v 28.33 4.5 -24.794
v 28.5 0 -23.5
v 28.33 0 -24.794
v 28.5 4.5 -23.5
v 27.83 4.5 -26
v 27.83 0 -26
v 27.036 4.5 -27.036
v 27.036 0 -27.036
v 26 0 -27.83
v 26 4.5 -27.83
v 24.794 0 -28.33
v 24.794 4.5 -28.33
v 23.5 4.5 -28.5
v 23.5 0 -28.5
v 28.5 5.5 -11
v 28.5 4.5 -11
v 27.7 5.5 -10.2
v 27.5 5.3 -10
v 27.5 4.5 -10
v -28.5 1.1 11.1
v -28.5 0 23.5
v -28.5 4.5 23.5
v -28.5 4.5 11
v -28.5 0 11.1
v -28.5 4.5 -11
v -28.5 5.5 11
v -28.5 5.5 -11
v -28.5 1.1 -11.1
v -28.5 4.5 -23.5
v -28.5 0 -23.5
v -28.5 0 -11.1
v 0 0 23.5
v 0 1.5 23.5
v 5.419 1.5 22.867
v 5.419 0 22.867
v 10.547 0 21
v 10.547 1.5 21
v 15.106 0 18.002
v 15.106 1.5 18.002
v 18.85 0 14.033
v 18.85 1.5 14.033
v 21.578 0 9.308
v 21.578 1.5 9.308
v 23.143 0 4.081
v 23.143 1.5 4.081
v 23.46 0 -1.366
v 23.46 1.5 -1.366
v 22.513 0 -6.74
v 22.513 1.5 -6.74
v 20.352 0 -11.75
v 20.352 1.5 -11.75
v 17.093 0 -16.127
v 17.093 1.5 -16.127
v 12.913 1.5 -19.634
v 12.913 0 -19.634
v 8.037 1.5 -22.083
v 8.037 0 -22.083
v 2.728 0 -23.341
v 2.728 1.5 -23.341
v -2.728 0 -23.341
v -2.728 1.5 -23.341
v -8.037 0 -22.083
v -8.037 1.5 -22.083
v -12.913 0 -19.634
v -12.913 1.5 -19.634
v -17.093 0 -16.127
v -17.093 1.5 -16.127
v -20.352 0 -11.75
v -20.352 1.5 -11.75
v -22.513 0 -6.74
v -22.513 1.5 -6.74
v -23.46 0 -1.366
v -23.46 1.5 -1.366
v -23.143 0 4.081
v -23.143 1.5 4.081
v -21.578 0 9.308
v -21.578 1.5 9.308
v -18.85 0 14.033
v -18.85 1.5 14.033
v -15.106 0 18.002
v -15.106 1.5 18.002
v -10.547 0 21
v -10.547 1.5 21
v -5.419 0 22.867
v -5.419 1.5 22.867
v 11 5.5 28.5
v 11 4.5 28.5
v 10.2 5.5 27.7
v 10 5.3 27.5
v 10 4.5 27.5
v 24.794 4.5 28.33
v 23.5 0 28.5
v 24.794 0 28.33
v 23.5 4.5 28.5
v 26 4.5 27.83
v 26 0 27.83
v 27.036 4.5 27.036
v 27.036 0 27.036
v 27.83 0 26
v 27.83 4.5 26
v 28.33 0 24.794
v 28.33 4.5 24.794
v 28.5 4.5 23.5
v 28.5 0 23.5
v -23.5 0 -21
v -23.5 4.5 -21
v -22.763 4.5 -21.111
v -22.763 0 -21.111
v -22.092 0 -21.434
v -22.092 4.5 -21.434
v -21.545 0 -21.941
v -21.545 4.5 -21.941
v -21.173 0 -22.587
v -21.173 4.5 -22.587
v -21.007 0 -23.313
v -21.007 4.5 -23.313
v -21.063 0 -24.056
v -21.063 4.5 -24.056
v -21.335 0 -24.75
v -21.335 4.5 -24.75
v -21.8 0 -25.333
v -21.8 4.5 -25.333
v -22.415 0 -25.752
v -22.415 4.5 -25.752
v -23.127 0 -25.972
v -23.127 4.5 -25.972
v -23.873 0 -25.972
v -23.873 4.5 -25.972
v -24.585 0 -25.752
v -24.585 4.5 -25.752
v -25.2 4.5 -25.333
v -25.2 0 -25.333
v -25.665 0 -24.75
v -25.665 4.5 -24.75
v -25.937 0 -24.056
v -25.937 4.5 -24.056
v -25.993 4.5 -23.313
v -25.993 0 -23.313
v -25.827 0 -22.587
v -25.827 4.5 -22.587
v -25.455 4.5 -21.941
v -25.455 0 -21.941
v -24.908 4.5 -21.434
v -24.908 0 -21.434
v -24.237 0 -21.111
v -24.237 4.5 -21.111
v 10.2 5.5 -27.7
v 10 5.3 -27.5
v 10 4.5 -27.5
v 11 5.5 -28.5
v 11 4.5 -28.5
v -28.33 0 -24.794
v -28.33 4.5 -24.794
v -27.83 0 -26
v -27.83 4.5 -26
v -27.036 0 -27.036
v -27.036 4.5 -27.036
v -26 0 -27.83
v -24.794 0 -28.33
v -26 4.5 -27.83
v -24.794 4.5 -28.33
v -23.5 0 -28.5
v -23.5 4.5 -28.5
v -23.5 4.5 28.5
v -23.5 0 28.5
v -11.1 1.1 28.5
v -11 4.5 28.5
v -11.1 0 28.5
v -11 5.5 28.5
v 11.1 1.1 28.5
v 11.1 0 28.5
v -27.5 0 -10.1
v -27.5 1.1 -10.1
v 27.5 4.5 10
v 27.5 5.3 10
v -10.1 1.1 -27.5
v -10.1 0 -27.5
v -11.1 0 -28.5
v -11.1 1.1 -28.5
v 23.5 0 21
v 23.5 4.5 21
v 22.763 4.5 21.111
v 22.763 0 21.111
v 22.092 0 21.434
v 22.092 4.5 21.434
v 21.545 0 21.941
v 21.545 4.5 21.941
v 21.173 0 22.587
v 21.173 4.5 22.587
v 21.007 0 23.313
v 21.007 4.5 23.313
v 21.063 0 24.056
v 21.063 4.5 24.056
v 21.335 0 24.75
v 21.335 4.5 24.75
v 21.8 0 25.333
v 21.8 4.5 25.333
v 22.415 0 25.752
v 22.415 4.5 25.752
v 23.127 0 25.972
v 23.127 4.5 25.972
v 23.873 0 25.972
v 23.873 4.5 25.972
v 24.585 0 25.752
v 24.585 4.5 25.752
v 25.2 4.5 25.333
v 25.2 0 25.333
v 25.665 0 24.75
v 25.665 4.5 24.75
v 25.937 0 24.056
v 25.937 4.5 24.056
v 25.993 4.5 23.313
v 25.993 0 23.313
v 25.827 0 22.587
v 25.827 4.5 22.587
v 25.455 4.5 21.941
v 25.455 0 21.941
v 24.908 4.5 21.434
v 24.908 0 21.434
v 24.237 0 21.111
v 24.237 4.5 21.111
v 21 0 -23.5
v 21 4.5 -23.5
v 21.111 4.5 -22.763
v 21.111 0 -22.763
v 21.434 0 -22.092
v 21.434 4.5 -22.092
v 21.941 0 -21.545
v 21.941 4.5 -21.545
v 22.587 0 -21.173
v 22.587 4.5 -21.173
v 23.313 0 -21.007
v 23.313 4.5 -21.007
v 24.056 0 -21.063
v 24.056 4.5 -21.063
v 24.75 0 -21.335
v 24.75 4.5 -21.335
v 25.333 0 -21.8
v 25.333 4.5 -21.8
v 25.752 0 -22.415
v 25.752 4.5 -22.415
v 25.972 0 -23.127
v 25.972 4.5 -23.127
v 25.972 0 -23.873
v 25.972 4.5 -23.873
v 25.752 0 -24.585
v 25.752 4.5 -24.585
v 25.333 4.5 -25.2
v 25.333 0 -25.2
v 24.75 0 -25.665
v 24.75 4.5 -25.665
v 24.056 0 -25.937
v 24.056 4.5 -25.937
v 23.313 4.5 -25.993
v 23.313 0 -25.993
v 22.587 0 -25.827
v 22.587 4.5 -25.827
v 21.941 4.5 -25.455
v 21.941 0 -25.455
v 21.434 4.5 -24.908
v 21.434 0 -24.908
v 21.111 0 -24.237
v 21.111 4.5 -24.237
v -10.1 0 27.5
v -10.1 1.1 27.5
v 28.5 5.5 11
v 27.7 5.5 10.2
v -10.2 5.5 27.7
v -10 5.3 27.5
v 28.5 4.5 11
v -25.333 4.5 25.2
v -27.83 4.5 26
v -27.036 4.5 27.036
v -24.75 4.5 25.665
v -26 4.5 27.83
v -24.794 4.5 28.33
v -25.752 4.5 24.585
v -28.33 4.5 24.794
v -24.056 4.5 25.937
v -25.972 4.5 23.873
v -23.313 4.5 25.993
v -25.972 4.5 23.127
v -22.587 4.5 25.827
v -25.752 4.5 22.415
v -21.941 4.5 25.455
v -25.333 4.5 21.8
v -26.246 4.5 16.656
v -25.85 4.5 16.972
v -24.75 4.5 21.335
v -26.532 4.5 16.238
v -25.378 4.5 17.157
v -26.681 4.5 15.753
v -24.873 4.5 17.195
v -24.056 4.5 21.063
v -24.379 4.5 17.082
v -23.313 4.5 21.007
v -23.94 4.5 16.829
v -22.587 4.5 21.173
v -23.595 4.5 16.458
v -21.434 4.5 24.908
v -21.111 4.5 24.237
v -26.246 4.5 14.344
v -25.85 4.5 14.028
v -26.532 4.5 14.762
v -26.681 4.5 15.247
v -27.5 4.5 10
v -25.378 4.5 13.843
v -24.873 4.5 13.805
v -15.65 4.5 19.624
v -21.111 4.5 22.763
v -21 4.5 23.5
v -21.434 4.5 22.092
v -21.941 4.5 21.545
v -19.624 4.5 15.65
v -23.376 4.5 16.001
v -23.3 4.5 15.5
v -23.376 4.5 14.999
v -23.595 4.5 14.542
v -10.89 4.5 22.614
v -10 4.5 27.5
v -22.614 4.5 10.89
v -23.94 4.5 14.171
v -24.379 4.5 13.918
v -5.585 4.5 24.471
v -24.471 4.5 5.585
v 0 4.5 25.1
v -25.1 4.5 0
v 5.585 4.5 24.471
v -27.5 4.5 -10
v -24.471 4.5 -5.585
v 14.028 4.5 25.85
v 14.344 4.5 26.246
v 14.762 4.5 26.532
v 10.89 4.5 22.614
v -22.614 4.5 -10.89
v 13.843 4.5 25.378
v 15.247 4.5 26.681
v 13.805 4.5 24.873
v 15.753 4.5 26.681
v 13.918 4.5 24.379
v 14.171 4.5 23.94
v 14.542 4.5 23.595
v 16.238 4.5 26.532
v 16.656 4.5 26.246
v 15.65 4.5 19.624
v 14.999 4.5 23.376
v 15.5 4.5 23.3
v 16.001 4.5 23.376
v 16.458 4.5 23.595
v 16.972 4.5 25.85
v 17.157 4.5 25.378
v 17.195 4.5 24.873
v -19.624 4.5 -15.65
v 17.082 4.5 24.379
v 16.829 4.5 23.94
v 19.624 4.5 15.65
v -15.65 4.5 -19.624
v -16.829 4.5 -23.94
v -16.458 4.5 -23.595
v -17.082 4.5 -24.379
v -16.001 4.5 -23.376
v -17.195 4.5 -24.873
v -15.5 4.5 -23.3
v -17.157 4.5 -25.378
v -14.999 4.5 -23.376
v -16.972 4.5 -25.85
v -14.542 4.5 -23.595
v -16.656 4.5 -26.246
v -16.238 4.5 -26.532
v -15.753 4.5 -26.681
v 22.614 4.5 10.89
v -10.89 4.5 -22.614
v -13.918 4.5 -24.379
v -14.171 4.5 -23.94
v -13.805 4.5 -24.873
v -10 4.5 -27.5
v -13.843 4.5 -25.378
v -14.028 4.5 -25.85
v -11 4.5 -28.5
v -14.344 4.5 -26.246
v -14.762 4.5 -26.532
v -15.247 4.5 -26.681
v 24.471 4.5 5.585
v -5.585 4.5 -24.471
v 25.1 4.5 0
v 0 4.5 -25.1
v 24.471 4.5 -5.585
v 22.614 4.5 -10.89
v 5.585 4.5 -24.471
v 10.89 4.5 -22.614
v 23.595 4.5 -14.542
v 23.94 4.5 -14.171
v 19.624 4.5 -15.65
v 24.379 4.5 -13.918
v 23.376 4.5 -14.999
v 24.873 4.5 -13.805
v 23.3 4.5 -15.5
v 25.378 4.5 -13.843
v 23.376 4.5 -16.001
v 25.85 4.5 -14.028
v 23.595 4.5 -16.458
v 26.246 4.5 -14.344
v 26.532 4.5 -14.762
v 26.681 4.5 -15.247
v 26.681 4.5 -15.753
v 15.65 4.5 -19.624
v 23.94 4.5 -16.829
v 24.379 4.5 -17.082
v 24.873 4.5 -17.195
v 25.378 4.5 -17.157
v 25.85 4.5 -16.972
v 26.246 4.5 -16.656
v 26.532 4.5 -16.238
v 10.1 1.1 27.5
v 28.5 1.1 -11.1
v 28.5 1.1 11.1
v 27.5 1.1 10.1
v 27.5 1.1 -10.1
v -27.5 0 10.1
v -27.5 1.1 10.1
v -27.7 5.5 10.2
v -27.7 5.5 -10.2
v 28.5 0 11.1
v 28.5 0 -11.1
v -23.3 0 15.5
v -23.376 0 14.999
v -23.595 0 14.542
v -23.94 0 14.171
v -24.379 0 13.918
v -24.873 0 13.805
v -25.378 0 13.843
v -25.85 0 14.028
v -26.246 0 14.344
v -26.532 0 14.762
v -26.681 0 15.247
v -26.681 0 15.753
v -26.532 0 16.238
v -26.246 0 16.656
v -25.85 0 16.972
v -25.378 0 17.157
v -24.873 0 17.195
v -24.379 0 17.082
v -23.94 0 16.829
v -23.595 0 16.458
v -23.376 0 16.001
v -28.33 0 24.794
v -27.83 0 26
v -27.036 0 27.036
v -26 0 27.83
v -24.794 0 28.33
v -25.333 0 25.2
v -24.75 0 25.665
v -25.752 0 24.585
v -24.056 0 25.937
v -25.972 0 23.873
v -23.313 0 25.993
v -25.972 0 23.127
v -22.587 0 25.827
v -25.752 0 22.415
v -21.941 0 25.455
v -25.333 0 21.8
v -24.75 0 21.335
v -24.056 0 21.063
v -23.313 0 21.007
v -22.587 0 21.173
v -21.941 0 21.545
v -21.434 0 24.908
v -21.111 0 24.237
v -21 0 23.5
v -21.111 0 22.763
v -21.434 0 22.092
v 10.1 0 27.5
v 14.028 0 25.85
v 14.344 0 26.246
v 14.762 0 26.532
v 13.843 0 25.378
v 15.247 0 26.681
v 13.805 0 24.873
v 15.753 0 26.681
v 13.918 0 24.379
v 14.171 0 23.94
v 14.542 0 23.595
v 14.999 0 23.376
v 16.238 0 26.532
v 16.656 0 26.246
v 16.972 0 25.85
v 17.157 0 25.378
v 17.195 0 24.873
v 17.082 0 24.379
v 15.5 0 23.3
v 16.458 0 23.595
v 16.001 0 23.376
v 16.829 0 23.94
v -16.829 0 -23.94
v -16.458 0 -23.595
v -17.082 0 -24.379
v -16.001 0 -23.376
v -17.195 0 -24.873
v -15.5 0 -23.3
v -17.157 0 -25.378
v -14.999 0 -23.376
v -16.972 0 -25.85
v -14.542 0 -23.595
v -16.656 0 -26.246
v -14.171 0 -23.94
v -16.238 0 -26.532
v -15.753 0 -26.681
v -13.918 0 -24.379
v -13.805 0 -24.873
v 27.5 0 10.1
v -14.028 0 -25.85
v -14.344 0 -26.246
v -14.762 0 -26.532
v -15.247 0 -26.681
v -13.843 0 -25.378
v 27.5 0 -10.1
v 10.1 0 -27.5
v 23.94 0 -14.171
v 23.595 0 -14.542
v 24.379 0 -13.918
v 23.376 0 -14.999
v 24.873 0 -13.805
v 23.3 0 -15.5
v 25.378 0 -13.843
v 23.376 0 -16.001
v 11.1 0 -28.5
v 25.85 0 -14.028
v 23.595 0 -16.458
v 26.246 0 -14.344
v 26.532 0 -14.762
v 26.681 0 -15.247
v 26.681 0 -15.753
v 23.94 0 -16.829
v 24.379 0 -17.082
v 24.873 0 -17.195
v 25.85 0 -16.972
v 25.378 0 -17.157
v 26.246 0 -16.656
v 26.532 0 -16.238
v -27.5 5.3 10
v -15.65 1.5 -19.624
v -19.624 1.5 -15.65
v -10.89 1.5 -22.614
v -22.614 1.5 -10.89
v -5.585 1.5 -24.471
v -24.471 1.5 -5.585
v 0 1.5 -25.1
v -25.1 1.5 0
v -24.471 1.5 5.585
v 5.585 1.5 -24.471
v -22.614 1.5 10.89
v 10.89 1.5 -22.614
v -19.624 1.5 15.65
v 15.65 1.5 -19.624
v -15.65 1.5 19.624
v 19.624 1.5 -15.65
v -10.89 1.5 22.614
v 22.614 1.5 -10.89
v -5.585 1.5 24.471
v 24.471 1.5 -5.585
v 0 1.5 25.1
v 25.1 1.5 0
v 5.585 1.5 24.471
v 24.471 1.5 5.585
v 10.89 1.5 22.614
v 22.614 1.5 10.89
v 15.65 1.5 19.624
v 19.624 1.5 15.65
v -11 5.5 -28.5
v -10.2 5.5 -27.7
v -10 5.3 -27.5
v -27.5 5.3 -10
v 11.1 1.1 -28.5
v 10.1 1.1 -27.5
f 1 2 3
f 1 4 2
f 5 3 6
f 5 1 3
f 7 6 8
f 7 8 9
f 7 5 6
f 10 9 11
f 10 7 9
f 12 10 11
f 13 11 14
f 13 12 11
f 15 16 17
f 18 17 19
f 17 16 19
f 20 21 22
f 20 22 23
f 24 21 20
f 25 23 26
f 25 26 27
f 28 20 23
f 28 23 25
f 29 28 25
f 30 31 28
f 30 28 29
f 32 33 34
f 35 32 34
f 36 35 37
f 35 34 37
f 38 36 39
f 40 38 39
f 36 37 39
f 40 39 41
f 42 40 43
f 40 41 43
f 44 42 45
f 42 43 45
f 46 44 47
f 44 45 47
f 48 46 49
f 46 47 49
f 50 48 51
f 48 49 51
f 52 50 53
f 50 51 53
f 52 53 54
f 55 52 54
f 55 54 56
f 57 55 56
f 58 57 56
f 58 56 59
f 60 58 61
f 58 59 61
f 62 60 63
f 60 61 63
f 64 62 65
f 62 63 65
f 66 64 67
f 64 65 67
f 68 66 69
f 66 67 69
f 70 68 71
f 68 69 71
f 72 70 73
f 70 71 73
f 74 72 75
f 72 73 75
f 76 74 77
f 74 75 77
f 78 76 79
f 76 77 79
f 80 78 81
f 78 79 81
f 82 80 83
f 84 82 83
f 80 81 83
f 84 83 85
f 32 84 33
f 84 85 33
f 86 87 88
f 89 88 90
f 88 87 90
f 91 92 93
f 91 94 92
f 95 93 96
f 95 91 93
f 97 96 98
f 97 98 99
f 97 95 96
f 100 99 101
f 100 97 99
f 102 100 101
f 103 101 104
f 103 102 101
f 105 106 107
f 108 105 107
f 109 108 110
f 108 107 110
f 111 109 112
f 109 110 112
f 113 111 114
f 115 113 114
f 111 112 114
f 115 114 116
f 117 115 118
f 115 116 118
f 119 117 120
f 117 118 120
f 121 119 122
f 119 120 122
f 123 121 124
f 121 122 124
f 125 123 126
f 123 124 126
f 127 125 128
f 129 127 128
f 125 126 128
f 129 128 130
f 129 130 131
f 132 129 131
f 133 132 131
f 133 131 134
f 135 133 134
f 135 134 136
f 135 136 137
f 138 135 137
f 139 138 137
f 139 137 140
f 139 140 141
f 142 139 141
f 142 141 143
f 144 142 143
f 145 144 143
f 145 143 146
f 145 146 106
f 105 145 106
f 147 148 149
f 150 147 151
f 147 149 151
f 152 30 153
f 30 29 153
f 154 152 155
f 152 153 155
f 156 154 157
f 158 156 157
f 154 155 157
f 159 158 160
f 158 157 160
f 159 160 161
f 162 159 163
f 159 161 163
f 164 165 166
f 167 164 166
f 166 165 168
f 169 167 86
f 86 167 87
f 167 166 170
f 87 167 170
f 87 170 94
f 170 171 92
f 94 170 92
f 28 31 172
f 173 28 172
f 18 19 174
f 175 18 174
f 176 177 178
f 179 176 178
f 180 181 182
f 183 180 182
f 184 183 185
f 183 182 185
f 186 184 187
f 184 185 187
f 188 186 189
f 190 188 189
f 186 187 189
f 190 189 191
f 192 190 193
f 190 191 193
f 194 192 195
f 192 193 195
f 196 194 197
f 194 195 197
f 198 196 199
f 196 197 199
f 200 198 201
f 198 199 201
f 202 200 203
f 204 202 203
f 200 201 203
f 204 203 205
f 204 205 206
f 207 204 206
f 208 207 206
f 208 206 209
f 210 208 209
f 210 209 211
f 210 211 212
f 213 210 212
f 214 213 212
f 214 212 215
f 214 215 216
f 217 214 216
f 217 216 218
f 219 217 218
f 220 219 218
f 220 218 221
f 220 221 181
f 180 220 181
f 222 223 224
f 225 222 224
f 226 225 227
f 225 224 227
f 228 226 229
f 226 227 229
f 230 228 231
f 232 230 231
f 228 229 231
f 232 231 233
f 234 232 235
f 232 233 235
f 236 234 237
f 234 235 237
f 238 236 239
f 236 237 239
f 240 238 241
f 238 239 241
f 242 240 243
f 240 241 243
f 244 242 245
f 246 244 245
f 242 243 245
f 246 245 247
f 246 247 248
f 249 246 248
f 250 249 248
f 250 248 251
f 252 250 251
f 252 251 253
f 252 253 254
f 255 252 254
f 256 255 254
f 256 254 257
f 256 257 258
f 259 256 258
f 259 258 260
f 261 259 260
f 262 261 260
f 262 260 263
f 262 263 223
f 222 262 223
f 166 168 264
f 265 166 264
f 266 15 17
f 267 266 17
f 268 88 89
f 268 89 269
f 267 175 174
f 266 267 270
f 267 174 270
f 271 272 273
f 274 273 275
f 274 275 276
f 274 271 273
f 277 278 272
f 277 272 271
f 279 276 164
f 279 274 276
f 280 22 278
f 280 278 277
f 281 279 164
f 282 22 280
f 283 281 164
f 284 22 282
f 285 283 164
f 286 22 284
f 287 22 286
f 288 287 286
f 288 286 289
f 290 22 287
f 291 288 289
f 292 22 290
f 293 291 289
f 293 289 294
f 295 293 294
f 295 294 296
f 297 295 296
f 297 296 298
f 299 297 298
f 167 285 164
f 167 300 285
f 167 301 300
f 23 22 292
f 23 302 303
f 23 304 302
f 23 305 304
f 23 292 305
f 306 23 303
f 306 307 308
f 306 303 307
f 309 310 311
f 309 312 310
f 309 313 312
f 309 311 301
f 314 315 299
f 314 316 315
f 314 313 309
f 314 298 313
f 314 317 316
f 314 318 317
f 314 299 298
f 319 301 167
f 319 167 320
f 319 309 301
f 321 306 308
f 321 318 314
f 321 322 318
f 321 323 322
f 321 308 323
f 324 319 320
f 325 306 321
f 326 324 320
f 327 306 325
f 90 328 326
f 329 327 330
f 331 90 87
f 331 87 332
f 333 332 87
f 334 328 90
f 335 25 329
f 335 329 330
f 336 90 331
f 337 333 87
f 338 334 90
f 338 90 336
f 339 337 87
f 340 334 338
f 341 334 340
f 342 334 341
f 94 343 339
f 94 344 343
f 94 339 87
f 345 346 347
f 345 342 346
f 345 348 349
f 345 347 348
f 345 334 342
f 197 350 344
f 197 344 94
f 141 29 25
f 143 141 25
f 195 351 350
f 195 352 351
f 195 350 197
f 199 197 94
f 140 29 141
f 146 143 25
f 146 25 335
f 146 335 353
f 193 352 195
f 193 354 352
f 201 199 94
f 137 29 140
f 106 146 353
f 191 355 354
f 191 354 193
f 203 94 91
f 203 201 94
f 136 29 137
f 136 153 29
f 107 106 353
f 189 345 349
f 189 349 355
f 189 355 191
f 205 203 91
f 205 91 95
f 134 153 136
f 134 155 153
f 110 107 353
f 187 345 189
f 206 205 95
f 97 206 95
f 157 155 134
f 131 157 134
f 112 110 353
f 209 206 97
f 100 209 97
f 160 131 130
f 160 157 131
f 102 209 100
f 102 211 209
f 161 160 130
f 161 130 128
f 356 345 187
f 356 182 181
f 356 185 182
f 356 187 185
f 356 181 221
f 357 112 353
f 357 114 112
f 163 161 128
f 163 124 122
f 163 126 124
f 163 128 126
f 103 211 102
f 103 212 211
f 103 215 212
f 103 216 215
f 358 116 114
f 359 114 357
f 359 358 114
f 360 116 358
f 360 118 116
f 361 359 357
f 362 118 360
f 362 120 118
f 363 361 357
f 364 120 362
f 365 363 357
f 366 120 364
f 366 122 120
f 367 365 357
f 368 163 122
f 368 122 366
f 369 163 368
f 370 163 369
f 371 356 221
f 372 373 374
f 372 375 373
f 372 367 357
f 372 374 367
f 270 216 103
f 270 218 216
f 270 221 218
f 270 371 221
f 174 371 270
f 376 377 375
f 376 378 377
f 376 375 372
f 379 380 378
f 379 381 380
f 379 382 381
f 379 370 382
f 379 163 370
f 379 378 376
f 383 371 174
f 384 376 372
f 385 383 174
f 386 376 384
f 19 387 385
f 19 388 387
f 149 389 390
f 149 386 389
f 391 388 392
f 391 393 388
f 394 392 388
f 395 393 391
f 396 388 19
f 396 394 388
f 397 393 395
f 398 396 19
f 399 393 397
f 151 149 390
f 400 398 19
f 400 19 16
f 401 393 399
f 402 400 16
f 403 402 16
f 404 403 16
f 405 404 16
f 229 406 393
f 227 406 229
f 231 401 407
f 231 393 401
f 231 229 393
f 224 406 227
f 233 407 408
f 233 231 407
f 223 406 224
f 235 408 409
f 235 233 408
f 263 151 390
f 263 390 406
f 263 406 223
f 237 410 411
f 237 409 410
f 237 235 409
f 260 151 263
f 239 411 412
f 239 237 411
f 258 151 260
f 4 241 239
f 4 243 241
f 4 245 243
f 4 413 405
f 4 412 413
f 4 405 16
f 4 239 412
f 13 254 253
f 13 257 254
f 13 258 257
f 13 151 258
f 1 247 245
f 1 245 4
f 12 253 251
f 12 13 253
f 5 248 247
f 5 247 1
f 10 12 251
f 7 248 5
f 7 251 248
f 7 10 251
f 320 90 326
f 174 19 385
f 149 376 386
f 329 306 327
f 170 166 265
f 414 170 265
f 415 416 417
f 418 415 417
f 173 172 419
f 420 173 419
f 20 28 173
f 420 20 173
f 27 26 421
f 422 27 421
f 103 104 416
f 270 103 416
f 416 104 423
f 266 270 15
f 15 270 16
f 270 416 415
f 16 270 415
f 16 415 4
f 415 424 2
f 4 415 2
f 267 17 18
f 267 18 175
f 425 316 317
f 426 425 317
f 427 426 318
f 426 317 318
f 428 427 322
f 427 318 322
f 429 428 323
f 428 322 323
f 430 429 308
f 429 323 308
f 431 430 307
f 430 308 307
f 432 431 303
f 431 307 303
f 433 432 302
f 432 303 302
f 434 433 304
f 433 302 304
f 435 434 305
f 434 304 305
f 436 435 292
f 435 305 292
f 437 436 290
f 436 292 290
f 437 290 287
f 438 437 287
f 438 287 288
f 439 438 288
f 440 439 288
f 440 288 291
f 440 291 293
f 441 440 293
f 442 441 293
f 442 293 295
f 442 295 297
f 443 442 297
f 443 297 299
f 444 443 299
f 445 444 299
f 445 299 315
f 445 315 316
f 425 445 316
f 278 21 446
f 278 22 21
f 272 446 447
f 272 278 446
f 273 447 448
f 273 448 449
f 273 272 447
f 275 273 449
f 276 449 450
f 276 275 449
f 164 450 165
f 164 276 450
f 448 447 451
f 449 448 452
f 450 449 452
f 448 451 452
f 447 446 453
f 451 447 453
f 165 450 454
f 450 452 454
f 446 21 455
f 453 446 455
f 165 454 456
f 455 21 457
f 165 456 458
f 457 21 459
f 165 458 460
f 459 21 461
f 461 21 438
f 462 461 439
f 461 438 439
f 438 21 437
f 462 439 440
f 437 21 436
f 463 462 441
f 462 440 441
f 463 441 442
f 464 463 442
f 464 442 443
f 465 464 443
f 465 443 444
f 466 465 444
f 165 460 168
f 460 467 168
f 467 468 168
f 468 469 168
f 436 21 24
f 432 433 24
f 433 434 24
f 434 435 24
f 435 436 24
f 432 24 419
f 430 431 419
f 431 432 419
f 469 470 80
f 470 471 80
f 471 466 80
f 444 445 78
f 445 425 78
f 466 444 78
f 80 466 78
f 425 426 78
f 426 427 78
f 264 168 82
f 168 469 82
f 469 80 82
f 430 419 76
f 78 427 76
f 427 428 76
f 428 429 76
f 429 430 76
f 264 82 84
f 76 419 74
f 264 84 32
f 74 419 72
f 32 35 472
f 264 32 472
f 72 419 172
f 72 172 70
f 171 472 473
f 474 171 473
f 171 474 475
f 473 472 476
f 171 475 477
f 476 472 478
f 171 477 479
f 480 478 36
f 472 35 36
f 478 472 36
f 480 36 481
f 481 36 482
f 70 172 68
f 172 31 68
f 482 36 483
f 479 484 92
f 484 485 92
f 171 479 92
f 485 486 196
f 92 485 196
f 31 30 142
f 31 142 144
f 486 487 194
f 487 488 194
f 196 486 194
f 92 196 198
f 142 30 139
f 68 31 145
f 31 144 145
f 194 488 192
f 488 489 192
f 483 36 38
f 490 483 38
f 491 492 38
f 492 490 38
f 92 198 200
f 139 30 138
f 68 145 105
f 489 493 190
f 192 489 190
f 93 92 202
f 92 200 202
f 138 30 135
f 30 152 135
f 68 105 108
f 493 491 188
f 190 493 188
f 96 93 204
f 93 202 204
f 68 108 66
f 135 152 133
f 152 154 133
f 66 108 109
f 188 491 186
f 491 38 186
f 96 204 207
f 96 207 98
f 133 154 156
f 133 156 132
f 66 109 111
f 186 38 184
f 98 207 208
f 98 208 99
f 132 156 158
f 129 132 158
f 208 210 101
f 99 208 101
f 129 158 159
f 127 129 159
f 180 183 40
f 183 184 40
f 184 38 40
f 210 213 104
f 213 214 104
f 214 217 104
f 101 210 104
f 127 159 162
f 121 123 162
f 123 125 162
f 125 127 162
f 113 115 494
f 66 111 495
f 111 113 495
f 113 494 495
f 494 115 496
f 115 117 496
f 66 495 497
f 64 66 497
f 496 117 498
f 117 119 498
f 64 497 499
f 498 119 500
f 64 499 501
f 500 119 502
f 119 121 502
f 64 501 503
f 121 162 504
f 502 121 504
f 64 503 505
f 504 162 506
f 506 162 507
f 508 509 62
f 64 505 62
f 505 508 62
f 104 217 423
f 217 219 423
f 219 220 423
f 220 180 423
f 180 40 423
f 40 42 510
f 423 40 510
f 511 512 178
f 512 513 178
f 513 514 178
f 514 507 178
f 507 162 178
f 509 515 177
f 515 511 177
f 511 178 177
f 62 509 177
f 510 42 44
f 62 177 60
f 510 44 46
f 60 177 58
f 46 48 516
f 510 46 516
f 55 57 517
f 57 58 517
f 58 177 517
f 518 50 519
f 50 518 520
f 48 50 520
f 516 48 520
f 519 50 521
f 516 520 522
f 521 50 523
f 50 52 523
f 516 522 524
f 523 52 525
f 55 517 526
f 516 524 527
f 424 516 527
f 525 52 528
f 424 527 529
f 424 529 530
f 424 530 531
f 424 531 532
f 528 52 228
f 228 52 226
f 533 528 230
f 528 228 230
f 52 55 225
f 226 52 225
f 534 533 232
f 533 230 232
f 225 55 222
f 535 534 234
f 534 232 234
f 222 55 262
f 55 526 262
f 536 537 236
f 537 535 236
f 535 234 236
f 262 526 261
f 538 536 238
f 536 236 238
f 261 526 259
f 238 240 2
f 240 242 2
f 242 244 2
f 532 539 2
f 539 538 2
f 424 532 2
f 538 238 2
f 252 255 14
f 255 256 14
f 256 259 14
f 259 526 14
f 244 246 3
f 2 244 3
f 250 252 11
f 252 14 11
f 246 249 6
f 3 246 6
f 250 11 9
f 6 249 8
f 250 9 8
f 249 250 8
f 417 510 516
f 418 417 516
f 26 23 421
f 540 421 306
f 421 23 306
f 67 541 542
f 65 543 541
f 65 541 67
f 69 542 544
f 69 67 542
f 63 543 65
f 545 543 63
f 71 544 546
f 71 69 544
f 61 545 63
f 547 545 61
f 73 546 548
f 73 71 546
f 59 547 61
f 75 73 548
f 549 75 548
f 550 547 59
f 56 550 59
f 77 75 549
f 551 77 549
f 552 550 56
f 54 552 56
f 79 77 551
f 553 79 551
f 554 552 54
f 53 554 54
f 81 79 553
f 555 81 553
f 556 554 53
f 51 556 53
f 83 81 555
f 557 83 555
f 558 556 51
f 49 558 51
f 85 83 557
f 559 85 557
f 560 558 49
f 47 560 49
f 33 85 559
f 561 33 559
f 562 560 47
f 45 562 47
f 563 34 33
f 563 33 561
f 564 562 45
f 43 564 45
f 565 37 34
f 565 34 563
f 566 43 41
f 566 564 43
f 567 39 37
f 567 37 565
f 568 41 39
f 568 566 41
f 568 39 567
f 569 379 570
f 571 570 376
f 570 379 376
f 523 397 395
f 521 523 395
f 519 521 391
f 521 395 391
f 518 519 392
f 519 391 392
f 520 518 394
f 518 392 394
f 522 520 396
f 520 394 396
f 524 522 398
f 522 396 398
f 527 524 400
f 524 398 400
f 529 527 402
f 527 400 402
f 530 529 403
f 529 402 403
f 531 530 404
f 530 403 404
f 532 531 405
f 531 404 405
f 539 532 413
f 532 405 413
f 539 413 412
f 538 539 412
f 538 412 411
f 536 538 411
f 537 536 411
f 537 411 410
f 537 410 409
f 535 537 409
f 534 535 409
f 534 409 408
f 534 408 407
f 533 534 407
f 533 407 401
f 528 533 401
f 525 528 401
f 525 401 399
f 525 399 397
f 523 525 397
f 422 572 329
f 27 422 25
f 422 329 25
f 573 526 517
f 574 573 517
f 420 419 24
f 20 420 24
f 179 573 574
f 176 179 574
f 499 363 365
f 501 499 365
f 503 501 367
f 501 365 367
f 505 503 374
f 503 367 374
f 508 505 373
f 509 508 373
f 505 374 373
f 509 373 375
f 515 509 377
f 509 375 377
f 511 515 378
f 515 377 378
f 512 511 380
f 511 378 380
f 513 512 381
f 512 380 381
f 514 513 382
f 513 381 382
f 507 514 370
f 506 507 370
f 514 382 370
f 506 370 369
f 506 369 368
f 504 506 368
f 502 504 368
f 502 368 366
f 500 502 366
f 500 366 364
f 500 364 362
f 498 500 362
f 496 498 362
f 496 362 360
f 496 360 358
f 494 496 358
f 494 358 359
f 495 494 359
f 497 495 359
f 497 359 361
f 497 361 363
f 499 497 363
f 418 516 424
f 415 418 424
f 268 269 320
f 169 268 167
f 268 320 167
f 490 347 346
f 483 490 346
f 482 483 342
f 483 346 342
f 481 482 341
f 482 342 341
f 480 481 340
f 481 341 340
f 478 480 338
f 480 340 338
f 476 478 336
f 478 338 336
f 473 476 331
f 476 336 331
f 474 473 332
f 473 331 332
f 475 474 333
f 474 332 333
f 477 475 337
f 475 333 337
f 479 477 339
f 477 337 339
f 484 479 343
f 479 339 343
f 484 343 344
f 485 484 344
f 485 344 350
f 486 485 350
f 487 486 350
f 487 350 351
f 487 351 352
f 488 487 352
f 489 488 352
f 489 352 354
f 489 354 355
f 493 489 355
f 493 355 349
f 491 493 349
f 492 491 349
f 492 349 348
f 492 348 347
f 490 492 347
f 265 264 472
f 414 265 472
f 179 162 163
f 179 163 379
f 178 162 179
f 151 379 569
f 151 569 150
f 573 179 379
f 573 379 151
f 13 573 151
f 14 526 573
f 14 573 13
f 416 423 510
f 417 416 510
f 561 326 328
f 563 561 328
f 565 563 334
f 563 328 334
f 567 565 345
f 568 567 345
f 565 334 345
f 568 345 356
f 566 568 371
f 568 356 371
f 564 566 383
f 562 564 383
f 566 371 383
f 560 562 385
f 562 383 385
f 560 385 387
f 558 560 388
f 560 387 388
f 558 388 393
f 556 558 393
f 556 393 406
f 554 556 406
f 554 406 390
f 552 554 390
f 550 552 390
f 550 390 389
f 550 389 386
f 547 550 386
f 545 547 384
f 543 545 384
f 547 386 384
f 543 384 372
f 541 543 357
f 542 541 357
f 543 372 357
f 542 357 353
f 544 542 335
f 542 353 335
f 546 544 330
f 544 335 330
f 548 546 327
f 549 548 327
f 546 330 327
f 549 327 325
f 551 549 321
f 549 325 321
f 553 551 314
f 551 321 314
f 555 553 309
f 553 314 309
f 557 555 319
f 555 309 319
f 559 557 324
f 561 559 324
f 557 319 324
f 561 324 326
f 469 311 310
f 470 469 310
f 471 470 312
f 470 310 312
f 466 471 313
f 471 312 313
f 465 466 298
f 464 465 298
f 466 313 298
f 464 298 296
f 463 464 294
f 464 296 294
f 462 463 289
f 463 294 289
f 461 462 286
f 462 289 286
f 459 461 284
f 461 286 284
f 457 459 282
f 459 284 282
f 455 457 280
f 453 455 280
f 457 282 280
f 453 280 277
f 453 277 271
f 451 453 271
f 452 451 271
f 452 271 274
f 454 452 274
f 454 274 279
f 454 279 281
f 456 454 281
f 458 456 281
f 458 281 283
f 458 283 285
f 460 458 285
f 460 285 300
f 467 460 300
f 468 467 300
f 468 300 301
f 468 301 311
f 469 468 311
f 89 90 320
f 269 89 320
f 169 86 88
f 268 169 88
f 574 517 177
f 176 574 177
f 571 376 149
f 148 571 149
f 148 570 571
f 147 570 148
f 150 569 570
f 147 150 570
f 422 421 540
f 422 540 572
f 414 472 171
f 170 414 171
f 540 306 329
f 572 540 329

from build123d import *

# Parameters (mm, degrees)
SKETCH_1_W                           = 57
SKETCH_1_H                           = 57
EXTRUDE_1_DEPTH                      = 4.5
FILLET_1_R                           = 5
SKETCH_2_R                           = 25.1
CUT_EXTRUDE_1_DEPTH                  = 3
SKETCH_3_R                           = 23.5
CUT_EXTRUDE_2_DEPTH                  = 1.5
SKETCH_4_R                           = 2.5
SKETCH_4_R_2                         = 1.7
CUT_EXTRUDE_3_DEPTH                  = 41.555517504
EXTRUDE_2_DEPTH                      = 1
CHAMFER_1_SIZE                       = 0.2
CUT_EXTRUDE_4_DEPTH                  = 1.1
PATTERN_CIRCULAR_1_COUNT             = 4
CHAMFER_1_OF_PATTERN_CIRCULAR_1_SIZE = 0.2


with BuildPart() as part:
    # 草图1 → 凸台-拉伸1 (new body)
    with BuildSketch(Plane(origin=(0, 0, 0), x_dir=(1, 0, 0), z_dir=(0, 1, 0))):
        Rectangle(SKETCH_1_W, SKETCH_1_H)
    extrude(amount=EXTRUDE_1_DEPTH)

    # 圆角1
    fillet_1_edges = [part.edges().sort_by_distance(p)[0] for p in [
        (28.5, 2.25, 28.5),
        (-28.5, 2.25, 28.5),
        (-28.5, 2.25, -28.5),
        (28.5, 2.25, -28.5),
    ]]
    fillet(fillet_1_edges, radius=FILLET_1_R)

    # 草图2 → 切除-拉伸1 (cut)
    with BuildSketch(Plane(origin=(0, 4.5, 0), x_dir=(1, 0, 0), z_dir=(0, 1, 0))):
        with Locations(Location((0, 0, 0), (0, 0, 270))):
            Circle(SKETCH_2_R)
    extrude(amount=-CUT_EXTRUDE_1_DEPTH, mode=Mode.SUBTRACT)

    # 草图3 → 切除-拉伸2 (cut)
    with BuildSketch(Plane(origin=(0, 1.5, 0), x_dir=(1, 0, 0), z_dir=(0, 1, 0))):
        with Locations(Location((0, 0, 0), (0, 0, 270))):
            Circle(SKETCH_3_R)
    extrude(amount=-CUT_EXTRUDE_2_DEPTH, mode=Mode.SUBTRACT)

    # 草图4 → 切除-拉伸3 (cut, through all)
    with BuildSketch(Plane(origin=(0, 4.5, 0), x_dir=(1, 0, 0), z_dir=(0, 1, 0))):
        with Locations(Location((-23.5, 23.5, 0), (0, 0, 270))):
            Circle(SKETCH_4_R)
        with Locations(Location((-15.5, 25, 0), (0, 0, 270))):
            Circle(SKETCH_4_R_2)
    cut_extrude_3 = extrude(amount=-CUT_EXTRUDE_3_DEPTH, mode=Mode.SUBTRACT)

    # 草图5 → 凸台-拉伸2 (add)
    with BuildSketch(Plane(origin=(0, 4.5, 0), x_dir=(1, 0, 0), z_dir=(0, 1, 0))):
        Polygon((-28.5, 11), (-28.5, -11), (-27.5, -10), (-27.5, 10), align=None)
    extrude_2 = extrude(amount=EXTRUDE_2_DEPTH)

    # 倒角1
    chamfer_1_edges = [part.edges().sort_by_distance(p)[0] for p in [
        (-27.5, 5.5, 0),
    ]]
    chamfer(chamfer_1_edges, length=CHAMFER_1_SIZE)

    # 草图6 → 切除-拉伸4 (cut)
    with BuildSketch(Plane.XZ):
        Polygon((-28.5, 11.1), (-28.5, -11.1), (-27.5, -10.1), (-27.5, 10.1), align=None)
    cut_extrude_4 = extrude(amount=-CUT_EXTRUDE_4_DEPTH, mode=Mode.SUBTRACT)

    # 阵列(圆周)1: 切除-拉伸3, 凸台-拉伸2, 切除-拉伸4 ×4 about axis
    pattern_circular_1_axis = Axis((0, 0, 0), (0, 1, 0))
    add([cut_extrude_3.rotate(pattern_circular_1_axis, i * 360 / PATTERN_CIRCULAR_1_COUNT) for i in range(1, PATTERN_CIRCULAR_1_COUNT)], mode=Mode.SUBTRACT)
    add([extrude_2.rotate(pattern_circular_1_axis, i * 360 / PATTERN_CIRCULAR_1_COUNT) for i in range(1, PATTERN_CIRCULAR_1_COUNT)])
    add([cut_extrude_4.rotate(pattern_circular_1_axis, i * 360 / PATTERN_CIRCULAR_1_COUNT) for i in range(1, PATTERN_CIRCULAR_1_COUNT)], mode=Mode.SUBTRACT)

    # 倒角1 of 阵列(圆周)1
    chamfer_1_of_pattern_circular_1_edges = [part.edges().sort_by_distance(p)[0] for p in [
        (0, 5.5, 27.5),
        (27.5, 5.5, 0),
        (0, 5.5, -27.5),
    ]]
    chamfer(chamfer_1_of_pattern_circular_1_edges, length=CHAMFER_1_OF_PATTERN_CIRCULAR_1_SIZE)


solid = part.part
